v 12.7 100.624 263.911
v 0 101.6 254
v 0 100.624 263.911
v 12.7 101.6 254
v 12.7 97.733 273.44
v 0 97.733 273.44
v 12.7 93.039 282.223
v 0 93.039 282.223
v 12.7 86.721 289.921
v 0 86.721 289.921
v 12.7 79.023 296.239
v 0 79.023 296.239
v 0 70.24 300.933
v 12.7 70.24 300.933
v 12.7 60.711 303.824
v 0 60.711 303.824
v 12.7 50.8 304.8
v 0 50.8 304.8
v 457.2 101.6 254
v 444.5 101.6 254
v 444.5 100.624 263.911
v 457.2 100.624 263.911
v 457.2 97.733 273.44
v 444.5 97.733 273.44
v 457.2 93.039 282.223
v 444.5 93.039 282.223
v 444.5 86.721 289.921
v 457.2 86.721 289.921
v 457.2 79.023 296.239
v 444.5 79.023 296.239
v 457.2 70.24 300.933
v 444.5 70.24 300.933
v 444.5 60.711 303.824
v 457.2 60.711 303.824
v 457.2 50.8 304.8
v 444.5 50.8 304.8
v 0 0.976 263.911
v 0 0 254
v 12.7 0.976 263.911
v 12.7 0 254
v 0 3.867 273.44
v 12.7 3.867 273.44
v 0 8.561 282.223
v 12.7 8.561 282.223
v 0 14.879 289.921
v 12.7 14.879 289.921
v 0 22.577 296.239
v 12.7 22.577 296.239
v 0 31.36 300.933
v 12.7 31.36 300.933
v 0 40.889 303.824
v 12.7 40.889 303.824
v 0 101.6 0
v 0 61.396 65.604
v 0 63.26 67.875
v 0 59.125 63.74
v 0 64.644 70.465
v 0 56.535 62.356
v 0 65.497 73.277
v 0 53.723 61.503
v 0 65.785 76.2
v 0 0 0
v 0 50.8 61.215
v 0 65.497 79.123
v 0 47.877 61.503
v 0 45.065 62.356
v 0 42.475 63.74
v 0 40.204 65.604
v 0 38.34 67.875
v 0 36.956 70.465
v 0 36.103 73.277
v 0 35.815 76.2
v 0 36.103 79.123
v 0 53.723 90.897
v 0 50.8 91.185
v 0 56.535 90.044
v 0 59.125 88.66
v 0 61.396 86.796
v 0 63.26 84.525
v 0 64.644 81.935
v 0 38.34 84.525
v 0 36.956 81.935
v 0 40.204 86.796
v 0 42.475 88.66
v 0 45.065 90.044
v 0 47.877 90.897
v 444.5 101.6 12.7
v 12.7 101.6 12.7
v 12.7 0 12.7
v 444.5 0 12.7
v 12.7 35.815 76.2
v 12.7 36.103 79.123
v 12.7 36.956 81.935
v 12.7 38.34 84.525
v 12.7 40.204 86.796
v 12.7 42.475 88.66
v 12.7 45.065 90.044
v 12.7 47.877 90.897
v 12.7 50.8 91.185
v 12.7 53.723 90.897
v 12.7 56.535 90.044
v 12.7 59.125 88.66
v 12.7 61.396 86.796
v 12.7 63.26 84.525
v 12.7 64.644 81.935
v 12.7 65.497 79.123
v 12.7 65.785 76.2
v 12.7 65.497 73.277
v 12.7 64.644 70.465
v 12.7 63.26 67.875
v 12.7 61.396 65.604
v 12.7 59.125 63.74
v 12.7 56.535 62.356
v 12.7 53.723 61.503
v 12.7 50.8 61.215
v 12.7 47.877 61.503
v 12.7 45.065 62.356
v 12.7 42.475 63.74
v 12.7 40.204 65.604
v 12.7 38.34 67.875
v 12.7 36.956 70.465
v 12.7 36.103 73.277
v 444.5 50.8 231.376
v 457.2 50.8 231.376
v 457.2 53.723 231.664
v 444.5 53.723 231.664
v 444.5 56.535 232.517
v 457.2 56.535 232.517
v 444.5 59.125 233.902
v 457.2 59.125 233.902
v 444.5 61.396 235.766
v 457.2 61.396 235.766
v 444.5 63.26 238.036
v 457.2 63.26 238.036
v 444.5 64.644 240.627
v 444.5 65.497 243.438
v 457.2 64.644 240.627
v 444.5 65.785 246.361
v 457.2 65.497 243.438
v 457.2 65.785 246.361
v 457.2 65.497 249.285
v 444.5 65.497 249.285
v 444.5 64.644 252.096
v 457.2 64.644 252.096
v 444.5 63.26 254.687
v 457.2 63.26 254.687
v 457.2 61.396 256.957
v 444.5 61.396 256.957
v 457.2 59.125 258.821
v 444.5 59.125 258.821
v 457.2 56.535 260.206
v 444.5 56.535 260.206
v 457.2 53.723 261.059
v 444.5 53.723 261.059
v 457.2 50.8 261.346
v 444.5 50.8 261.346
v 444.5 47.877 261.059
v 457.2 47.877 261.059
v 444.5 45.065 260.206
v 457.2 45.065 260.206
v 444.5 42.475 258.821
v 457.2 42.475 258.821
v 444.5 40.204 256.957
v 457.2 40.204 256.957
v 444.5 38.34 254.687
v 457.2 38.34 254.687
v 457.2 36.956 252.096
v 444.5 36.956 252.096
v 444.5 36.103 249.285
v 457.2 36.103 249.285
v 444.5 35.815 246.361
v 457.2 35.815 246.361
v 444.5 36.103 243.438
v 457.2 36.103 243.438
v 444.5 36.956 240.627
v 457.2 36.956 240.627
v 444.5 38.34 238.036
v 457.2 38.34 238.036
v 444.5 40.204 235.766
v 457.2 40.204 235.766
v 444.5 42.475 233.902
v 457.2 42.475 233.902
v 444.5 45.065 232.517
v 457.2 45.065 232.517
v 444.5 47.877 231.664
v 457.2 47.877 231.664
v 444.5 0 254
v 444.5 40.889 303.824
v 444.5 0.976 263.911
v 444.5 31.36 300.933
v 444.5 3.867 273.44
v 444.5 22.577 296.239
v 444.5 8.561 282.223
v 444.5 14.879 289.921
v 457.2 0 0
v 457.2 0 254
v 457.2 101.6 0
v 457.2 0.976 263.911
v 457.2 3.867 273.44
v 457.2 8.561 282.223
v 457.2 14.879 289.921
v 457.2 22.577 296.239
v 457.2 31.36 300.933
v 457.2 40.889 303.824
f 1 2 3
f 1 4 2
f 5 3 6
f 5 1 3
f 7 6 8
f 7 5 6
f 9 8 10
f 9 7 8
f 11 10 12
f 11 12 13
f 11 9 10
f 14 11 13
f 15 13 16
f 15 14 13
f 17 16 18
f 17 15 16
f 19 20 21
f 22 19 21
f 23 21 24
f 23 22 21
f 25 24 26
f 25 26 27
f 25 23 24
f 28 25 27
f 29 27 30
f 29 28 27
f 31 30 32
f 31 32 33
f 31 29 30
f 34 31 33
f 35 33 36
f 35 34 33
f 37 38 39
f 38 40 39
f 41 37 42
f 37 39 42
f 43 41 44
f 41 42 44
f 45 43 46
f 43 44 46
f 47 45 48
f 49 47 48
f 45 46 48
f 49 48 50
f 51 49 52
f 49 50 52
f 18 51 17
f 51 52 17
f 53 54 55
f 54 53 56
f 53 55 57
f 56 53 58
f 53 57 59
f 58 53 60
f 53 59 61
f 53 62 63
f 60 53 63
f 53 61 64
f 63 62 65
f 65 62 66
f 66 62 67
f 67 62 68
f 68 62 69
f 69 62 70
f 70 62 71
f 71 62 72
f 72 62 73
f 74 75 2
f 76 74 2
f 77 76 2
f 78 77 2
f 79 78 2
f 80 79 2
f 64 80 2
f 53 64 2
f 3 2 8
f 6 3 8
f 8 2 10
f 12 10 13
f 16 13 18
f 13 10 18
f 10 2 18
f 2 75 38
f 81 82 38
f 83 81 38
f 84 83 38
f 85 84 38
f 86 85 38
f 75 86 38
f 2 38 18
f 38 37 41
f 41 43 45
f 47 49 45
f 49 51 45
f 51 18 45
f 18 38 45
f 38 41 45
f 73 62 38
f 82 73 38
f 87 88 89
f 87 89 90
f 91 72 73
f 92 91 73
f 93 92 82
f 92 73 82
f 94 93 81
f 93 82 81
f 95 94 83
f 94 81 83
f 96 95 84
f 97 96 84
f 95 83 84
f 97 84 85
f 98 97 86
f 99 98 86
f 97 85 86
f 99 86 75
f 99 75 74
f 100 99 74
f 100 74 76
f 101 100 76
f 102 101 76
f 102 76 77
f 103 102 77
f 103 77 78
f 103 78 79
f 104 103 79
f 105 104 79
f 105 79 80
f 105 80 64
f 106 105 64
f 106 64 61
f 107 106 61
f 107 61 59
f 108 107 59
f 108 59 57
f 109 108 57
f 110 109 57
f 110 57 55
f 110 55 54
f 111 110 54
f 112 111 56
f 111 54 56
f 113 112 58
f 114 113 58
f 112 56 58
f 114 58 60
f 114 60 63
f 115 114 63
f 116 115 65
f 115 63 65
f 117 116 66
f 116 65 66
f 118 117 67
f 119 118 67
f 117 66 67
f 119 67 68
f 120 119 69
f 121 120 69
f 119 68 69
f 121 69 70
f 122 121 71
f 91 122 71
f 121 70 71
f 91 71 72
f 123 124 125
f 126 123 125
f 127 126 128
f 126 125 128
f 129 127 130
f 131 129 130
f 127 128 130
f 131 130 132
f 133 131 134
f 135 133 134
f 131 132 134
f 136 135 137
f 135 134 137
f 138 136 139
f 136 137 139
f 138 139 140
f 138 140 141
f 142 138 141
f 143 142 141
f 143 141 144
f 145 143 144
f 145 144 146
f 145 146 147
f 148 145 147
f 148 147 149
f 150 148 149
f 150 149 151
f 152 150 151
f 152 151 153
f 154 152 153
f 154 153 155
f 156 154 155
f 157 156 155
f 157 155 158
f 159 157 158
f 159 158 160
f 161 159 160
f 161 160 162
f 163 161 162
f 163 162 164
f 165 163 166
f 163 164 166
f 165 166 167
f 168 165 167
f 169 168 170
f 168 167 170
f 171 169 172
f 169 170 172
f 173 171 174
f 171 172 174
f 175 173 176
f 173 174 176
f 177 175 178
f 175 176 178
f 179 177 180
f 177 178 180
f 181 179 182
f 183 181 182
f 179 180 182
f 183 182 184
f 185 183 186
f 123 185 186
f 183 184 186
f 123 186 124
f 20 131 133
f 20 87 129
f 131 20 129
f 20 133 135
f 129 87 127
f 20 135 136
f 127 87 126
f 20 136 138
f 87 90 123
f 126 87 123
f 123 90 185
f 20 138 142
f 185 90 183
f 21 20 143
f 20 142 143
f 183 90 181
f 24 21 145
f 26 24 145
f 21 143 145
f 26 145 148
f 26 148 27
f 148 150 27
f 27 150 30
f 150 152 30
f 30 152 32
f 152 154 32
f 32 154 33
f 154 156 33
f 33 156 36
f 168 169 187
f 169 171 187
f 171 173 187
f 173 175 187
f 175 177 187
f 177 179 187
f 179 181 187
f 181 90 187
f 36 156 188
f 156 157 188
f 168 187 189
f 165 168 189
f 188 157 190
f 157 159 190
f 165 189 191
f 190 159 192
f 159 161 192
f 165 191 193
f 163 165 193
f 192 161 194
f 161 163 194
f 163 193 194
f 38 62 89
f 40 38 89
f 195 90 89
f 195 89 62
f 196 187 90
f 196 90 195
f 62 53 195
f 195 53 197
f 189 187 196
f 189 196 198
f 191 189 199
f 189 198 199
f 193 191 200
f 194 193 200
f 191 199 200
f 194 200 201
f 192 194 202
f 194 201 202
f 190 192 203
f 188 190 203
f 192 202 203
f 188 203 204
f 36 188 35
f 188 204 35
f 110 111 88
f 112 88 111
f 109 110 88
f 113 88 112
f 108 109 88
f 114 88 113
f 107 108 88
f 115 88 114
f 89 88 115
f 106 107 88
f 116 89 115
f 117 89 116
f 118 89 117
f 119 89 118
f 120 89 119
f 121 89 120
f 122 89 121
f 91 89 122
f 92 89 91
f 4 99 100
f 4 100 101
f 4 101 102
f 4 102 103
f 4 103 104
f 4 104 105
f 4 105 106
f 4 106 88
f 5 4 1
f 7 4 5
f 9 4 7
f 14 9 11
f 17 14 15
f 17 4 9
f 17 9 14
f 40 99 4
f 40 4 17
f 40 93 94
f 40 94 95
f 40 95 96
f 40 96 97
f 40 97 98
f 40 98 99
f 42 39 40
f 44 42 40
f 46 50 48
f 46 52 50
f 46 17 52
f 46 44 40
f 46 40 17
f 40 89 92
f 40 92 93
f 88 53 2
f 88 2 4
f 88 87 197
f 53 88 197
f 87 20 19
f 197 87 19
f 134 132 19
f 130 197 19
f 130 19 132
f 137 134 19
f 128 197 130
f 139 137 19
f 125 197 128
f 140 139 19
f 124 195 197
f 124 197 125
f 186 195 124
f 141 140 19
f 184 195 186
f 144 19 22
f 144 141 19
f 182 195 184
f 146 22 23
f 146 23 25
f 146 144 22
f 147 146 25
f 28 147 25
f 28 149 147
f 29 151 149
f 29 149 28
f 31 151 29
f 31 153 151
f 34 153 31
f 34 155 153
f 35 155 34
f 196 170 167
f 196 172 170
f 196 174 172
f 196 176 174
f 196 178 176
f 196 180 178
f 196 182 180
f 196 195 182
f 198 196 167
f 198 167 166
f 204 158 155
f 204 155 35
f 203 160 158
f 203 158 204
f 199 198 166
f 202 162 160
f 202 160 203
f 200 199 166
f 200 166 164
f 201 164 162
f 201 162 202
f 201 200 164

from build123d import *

# Parameters (mm, degrees)
SKETCH1_W           = 457.2
SKETCH1_H           = 101.6
BASE_FLANGE1_DEPTH  = 12.7
SKETCH6_W           = 12.7
SKETCH6_H           = 292.1
BOSS_EXTRUDE1_DEPTH = 101.6
SKETCH9_W           = 12.7
SKETCH9_H           = 292.1
BOSS_EXTRUDE2_DEPTH = 101.6
CUT_EXTRUDE1_REACH  = 560.8
SKETCH12_R          = 14.985
FILLET1_R           = 50.8
FILLET2_R           = 50.8
CUT_EXTRUDE2_REACH  = 560.8
SKETCH13_R          = 14.985


# Sheet-metal steps are written as plain solids
with BuildPart() as part:
    # Sketch1 → Base-Flange1 (new body)
    with BuildSketch(Plane.XY):
        with Locations((228.6, 50.8)):
            Rectangle(SKETCH1_W, SKETCH1_H)
    extrude(amount=BASE_FLANGE1_DEPTH)

    # Sketch6 → Boss-Extrude1 (add, through all)
    with BuildSketch(Plane.XZ):
        with Locations((6.35, 158.75)):
            Rectangle(SKETCH6_W, SKETCH6_H)
    extrude(amount=-BOSS_EXTRUDE1_DEPTH)

    # Sketch9 → Boss-Extrude2 (add, through all)
    with BuildSketch(Plane.XZ):
        with Locations((450.85, 158.75)):
            Rectangle(SKETCH9_W, SKETCH9_H)
    extrude(amount=-BOSS_EXTRUDE2_DEPTH)

    # Sketch12 → Cut-Extrude1 (cut, up to next)
    with BuildSketch(Plane(origin=(457.2, 0, 0), x_dir=(0, 0, -1), z_dir=(1, 0, 0)), mode=Mode.PRIVATE) as cut_extrude1_sk1:
        with Locations((-246.361498901, 50.8)):
            Circle(SKETCH12_R)
    cut_extrude1_tool1 = extrude(cut_extrude1_sk1.sketch, amount=-CUT_EXTRUDE1_REACH, mode=Mode.PRIVATE) & part.part
    add(cut_extrude1_tool1.solids().sort_by_distance((457.2, 50.8, 246.361499))[0], mode=Mode.SUBTRACT)

    # Fillet1
    fillet1_edges = [part.edges().sort_by_distance(p)[0] for p in [
        (450.85, 0, 304.8),
        (450.85, 101.6, 304.8),
    ]]
    fillet(fillet1_edges, radius=FILLET1_R - 0.0001)  # a hair under: the kernel refuses the full size

    # Fillet2
    fillet2_edges = [part.edges().sort_by_distance(p)[0] for p in [
        (6.35, 0, 304.8),
        (6.35, 101.6, 304.8),
    ]]
    fillet(fillet2_edges, radius=FILLET2_R - 0.0001)  # a hair under: the kernel refuses the full size

    # Sketch13 → Cut-Extrude2 (cut, up to next)
    with BuildSketch(Plane.ZY, mode=Mode.PRIVATE) as cut_extrude2_sk1:
        with Locations(Location((76.2, 50.8, 0), (0, 0, 270))):
            Circle(SKETCH13_R)
    cut_extrude2_tool1 = extrude(cut_extrude2_sk1.sketch, amount=-CUT_EXTRUDE2_REACH, mode=Mode.PRIVATE) & part.part
    add(cut_extrude2_tool1.solids().sort_by_distance((0, 50.8, 76.2))[0], mode=Mode.SUBTRACT)


solid = part.part
